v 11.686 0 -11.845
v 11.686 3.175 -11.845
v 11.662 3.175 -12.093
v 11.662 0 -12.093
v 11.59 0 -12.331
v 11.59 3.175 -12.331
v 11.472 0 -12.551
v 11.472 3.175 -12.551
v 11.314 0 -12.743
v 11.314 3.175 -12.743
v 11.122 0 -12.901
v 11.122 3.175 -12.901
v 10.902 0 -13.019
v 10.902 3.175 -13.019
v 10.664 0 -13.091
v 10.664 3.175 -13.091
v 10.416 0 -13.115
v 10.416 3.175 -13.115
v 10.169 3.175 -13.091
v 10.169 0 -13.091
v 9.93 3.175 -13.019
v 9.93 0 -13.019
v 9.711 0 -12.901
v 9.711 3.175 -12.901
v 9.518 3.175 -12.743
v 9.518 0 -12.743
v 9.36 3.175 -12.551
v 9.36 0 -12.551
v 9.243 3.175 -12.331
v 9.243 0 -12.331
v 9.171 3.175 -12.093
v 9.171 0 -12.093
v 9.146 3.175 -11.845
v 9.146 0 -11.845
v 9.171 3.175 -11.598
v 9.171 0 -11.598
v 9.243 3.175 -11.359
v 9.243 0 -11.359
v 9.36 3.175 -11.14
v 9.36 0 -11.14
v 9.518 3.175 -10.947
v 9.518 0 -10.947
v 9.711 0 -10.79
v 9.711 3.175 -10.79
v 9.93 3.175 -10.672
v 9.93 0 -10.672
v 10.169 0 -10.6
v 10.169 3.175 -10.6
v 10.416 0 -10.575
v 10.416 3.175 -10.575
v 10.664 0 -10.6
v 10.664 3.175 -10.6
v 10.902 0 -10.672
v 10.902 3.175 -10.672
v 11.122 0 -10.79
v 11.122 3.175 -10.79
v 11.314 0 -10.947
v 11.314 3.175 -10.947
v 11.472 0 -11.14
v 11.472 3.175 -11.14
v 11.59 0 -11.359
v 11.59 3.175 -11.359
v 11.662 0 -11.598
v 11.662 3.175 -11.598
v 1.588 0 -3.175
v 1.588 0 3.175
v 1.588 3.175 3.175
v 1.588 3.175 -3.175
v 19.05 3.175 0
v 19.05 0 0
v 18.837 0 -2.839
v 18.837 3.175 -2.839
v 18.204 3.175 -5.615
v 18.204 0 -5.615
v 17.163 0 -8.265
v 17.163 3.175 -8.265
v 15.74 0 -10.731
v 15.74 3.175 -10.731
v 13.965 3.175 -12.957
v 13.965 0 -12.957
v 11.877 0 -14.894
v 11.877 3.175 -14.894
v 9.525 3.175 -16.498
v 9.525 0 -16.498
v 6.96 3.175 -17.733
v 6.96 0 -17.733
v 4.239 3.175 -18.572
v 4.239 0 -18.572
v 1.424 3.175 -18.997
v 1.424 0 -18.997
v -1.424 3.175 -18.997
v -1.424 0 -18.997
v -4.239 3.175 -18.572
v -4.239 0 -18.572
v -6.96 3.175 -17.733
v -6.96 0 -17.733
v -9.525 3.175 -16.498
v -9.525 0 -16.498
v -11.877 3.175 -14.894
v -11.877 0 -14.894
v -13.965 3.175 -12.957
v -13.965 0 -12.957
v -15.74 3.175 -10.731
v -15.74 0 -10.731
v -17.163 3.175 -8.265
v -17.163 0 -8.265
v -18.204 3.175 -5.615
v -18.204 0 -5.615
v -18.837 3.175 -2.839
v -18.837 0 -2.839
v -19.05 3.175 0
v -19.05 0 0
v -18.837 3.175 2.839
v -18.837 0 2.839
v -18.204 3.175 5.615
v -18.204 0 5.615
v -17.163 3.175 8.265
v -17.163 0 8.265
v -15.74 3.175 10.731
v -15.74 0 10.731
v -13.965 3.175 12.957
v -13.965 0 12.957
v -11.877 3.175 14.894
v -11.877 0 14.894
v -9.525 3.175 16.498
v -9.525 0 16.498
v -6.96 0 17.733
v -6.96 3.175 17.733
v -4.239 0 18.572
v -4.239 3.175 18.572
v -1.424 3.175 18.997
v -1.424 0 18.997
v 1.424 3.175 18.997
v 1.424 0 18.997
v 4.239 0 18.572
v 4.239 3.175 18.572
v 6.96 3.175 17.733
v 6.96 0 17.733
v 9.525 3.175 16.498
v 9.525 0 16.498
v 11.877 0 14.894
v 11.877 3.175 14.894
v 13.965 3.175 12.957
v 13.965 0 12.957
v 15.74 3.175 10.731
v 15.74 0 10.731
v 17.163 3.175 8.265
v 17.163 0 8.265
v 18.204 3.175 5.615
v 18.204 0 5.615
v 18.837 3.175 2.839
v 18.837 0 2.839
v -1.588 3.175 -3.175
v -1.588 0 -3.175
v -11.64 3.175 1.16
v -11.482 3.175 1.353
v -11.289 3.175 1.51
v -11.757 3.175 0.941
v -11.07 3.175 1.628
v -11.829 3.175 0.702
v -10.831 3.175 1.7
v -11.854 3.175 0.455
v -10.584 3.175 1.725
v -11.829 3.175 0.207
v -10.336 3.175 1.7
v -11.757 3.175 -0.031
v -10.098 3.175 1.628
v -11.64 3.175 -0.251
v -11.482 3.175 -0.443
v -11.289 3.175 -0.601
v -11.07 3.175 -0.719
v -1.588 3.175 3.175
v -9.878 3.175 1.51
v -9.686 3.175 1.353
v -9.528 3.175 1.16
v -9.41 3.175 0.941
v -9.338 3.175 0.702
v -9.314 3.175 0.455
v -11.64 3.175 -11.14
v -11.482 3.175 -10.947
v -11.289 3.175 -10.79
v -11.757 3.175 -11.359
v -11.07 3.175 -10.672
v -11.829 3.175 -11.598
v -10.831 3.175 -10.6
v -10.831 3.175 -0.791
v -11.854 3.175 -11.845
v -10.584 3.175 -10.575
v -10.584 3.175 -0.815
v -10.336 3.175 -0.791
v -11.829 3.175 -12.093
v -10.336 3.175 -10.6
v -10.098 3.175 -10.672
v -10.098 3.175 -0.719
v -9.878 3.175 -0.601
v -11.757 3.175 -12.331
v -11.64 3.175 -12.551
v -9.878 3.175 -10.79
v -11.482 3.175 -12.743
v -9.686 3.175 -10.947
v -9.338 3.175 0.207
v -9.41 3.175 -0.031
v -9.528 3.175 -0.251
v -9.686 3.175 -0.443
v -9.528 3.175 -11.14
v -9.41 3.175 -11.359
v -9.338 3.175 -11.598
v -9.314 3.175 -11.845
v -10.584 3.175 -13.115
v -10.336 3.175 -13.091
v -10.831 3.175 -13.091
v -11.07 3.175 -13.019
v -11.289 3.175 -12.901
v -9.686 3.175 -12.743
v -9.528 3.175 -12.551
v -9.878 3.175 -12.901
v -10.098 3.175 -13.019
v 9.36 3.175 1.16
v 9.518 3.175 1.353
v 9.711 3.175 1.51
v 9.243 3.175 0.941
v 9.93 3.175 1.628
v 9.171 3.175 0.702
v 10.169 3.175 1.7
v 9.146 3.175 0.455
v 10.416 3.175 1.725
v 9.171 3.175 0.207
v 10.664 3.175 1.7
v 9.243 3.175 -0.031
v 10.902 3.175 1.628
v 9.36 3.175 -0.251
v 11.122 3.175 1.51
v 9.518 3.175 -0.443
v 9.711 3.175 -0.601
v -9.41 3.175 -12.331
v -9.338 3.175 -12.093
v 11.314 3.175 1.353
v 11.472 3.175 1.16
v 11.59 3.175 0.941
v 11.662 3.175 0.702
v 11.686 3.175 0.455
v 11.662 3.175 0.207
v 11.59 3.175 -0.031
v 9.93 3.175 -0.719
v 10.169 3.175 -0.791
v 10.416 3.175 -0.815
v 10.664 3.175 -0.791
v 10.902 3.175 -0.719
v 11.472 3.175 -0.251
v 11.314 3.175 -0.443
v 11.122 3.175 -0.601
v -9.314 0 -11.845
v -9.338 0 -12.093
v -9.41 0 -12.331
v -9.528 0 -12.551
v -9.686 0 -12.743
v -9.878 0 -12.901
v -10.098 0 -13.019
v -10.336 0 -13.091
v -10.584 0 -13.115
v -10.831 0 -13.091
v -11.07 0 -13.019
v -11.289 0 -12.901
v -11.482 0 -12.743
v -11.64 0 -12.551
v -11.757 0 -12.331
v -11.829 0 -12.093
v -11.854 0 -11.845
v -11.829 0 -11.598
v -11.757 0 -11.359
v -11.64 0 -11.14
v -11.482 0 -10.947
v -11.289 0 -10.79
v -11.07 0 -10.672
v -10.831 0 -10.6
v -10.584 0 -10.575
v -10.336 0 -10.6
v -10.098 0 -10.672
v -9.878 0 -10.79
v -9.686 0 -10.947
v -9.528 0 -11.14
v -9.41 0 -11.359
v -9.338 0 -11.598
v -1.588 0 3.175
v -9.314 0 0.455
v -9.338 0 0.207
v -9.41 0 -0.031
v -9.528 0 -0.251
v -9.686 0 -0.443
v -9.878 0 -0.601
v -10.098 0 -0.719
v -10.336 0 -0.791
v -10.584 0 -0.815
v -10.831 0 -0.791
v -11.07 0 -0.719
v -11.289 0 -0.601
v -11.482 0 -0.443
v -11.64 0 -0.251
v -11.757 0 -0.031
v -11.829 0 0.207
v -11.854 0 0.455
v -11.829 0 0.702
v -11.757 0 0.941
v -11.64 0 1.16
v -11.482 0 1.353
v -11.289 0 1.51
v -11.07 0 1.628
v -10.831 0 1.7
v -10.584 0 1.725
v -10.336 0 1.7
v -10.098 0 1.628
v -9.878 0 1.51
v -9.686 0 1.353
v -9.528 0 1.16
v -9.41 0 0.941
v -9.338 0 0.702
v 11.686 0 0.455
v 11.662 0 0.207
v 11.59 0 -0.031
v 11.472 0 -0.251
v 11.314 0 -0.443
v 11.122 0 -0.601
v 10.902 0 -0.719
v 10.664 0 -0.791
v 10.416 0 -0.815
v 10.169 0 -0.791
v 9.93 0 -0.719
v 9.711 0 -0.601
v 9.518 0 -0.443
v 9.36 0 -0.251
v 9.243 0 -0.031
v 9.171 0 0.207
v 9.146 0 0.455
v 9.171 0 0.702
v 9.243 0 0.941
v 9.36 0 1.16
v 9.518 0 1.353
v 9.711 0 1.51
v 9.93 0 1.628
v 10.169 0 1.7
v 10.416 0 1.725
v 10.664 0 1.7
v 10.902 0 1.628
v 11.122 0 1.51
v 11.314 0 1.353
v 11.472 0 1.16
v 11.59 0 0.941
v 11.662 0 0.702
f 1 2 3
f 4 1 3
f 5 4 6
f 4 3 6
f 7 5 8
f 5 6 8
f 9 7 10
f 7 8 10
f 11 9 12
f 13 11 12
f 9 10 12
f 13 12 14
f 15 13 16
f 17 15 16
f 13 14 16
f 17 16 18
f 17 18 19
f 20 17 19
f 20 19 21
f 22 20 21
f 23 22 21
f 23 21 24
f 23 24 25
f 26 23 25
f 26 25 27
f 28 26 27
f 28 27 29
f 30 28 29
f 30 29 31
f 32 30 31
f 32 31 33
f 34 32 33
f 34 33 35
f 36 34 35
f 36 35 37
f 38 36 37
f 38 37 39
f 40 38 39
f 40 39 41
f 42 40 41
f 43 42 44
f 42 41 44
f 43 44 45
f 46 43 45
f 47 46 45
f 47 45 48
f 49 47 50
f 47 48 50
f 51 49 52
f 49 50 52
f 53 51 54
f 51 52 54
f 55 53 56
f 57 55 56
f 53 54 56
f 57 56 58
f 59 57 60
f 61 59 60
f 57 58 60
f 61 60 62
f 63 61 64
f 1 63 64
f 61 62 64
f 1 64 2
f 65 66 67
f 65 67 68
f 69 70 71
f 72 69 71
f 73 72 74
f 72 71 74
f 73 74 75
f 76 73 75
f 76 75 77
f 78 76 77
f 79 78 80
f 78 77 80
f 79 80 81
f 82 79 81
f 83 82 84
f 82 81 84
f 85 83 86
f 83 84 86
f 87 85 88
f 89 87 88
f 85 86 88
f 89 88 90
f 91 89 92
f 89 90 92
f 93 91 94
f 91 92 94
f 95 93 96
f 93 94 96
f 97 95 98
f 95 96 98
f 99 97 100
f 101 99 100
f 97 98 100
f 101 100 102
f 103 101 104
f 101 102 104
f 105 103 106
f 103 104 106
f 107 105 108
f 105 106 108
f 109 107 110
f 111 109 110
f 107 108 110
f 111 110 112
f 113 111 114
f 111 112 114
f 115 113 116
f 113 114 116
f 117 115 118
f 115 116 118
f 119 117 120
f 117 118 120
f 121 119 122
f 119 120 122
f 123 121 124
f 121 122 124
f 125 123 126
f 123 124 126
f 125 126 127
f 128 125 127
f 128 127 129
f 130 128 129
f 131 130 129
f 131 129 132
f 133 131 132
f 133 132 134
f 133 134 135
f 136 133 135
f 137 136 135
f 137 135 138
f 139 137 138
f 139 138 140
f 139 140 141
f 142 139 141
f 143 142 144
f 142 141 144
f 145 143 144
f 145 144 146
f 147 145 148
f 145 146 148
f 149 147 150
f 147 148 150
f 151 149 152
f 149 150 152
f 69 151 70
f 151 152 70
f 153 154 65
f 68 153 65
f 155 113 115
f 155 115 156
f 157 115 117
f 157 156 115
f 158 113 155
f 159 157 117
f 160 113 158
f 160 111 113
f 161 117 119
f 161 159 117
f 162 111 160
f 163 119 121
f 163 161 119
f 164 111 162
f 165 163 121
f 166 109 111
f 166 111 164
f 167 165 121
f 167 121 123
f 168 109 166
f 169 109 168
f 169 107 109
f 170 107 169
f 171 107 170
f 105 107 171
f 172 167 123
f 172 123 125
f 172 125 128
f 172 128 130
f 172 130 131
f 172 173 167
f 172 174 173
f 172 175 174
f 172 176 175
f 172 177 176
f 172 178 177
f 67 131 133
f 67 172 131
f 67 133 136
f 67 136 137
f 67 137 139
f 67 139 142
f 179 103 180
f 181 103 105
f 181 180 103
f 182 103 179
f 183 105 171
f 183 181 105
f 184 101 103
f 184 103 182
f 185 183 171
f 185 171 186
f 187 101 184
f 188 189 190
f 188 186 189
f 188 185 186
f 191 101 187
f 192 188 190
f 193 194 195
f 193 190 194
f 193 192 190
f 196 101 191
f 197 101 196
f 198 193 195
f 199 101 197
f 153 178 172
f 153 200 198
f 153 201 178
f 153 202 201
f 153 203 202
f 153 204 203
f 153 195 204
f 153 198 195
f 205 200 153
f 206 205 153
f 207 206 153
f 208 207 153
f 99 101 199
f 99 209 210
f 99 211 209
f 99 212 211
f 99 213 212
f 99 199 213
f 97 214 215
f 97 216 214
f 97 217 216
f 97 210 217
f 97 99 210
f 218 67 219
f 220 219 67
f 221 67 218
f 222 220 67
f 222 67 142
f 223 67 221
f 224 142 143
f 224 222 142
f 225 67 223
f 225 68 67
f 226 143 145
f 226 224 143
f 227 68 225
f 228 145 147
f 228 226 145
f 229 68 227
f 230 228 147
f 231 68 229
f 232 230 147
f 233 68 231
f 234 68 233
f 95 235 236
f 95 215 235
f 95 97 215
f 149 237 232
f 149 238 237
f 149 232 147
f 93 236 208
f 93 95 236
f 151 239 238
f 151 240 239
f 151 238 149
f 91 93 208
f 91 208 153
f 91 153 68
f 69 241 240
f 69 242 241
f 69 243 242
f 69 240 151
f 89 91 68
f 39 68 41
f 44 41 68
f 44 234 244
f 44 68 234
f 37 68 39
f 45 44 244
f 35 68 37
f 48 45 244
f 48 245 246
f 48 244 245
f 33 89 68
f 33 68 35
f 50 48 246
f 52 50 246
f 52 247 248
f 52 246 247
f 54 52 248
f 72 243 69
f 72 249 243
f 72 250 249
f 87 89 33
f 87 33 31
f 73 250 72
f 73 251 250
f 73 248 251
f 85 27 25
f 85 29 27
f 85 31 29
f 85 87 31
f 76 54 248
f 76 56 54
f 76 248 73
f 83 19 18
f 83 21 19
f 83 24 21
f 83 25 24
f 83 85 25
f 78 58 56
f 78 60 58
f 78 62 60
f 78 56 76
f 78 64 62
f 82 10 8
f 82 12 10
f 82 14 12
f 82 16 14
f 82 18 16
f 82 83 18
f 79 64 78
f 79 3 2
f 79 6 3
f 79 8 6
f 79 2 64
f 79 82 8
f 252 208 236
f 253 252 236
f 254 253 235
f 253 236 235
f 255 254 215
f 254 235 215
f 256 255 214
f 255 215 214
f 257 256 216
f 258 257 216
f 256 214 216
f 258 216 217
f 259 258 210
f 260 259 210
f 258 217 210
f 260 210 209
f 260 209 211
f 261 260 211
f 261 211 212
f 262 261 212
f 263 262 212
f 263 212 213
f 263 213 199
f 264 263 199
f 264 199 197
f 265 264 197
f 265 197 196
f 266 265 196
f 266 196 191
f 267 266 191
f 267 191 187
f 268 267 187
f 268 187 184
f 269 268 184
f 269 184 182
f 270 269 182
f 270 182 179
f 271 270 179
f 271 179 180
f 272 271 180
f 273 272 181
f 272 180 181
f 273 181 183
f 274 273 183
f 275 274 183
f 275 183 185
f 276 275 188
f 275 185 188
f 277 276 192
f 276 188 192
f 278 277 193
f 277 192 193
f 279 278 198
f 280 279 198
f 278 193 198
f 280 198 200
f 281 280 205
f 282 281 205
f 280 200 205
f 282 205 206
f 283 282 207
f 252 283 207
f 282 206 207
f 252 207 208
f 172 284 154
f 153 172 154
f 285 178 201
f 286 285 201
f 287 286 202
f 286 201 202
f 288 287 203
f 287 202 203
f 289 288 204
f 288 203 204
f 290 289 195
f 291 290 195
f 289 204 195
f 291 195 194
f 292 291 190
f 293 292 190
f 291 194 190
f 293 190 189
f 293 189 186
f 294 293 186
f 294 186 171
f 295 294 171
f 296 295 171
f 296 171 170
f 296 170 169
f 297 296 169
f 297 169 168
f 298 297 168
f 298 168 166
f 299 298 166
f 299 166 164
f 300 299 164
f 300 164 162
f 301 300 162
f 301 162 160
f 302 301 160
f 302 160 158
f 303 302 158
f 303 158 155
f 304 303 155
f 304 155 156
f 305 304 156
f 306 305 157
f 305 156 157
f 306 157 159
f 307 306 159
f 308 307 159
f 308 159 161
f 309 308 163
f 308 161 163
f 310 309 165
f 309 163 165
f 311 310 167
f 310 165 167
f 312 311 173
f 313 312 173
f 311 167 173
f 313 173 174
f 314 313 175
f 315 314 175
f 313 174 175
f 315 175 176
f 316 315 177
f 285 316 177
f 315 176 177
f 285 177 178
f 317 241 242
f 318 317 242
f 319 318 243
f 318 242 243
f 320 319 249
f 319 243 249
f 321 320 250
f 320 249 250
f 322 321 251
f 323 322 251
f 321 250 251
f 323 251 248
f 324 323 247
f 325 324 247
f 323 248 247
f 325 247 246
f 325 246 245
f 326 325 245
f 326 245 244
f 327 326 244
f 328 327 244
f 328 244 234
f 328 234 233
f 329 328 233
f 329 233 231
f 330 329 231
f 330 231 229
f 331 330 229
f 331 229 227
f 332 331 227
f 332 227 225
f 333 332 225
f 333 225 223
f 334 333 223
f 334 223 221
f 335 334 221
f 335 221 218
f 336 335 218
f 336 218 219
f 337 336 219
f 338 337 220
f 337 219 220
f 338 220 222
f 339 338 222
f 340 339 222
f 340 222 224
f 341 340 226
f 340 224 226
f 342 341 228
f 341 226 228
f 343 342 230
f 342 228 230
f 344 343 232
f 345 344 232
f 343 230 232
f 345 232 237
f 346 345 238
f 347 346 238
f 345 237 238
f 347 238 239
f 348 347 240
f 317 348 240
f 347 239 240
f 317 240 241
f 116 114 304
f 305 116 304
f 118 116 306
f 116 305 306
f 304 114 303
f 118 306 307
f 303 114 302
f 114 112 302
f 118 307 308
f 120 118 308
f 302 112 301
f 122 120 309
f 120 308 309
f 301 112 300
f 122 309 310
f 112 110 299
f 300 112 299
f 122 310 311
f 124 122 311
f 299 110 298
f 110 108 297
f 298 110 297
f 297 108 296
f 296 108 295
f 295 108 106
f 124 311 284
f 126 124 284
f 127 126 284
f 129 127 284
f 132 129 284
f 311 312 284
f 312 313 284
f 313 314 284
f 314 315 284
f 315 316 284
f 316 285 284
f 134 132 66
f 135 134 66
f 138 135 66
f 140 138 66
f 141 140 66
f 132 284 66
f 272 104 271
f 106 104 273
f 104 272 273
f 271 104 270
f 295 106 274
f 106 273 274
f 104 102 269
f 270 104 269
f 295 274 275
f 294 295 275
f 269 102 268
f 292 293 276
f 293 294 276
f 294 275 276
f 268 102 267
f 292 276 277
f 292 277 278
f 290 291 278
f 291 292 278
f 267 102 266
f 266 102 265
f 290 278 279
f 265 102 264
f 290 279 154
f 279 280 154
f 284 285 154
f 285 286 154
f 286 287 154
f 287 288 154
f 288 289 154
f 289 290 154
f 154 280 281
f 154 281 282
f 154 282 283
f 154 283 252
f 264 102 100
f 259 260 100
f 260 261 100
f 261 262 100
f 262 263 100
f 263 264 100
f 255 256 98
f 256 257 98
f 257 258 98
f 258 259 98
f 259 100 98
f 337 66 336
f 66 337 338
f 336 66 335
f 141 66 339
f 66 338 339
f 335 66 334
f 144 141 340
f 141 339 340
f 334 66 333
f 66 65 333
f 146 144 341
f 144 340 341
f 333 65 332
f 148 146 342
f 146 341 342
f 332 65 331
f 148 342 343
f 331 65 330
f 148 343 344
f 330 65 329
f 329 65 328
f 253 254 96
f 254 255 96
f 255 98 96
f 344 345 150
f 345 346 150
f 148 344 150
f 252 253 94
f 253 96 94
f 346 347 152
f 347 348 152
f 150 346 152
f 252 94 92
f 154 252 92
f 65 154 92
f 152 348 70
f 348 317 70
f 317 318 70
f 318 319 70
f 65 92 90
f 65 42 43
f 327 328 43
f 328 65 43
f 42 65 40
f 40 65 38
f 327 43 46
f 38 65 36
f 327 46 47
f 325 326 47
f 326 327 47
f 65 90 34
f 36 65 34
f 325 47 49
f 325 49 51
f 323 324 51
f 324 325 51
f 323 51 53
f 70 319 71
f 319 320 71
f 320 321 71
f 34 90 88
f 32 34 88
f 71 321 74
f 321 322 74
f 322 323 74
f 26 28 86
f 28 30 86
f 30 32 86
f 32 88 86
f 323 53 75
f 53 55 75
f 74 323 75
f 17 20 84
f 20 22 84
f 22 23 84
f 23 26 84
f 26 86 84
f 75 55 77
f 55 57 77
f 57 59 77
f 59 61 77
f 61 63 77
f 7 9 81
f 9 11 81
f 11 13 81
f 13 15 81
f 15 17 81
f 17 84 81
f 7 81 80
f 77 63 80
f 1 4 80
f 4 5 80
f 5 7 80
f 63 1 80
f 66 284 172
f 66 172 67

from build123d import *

# Parameters (mm, degrees)
SKETCH1_R           = 19.05
SKETCH1_W           = 3.175
SKETCH1_H           = 6.35
BOSS_EXTRUDE1_DEPTH = 3.175
SKETCH2_R           = 1.27
CUT_EXTRUDE1_DEPTH  = 4.175


with BuildPart() as part:
    # Sketch1 → Boss-Extrude1 (new body)
    with BuildSketch(Plane(origin=(0, 0, 0), x_dir=(1, 0, 0), z_dir=(0, 1, 0))):
        Circle(SKETCH1_R)
        Rectangle(SKETCH1_W, SKETCH1_H, mode=Mode.SUBTRACT)
    extrude(amount=BOSS_EXTRUDE1_DEPTH)

    # Sketch2 → Cut-Extrude1 (cut, through all)
    with BuildSketch(Plane(origin=(0, 3.175, 0), x_dir=(1, 0, 0), z_dir=(0, 1, 0))):
        with Locations((10.416417342, -0.454529354)):
            Circle(SKETCH2_R)
        with Locations((-10.583582658, -0.454529354)):
            Circle(SKETCH2_R)
        with Locations((-10.583582658, 11.845470646)):
            Circle(SKETCH2_R)
        with Locations((10.416417342, 11.845470646)):
            Circle(SKETCH2_R)
    extrude(amount=-CUT_EXTRUDE1_DEPTH, mode=Mode.SUBTRACT)


solid = part.part
